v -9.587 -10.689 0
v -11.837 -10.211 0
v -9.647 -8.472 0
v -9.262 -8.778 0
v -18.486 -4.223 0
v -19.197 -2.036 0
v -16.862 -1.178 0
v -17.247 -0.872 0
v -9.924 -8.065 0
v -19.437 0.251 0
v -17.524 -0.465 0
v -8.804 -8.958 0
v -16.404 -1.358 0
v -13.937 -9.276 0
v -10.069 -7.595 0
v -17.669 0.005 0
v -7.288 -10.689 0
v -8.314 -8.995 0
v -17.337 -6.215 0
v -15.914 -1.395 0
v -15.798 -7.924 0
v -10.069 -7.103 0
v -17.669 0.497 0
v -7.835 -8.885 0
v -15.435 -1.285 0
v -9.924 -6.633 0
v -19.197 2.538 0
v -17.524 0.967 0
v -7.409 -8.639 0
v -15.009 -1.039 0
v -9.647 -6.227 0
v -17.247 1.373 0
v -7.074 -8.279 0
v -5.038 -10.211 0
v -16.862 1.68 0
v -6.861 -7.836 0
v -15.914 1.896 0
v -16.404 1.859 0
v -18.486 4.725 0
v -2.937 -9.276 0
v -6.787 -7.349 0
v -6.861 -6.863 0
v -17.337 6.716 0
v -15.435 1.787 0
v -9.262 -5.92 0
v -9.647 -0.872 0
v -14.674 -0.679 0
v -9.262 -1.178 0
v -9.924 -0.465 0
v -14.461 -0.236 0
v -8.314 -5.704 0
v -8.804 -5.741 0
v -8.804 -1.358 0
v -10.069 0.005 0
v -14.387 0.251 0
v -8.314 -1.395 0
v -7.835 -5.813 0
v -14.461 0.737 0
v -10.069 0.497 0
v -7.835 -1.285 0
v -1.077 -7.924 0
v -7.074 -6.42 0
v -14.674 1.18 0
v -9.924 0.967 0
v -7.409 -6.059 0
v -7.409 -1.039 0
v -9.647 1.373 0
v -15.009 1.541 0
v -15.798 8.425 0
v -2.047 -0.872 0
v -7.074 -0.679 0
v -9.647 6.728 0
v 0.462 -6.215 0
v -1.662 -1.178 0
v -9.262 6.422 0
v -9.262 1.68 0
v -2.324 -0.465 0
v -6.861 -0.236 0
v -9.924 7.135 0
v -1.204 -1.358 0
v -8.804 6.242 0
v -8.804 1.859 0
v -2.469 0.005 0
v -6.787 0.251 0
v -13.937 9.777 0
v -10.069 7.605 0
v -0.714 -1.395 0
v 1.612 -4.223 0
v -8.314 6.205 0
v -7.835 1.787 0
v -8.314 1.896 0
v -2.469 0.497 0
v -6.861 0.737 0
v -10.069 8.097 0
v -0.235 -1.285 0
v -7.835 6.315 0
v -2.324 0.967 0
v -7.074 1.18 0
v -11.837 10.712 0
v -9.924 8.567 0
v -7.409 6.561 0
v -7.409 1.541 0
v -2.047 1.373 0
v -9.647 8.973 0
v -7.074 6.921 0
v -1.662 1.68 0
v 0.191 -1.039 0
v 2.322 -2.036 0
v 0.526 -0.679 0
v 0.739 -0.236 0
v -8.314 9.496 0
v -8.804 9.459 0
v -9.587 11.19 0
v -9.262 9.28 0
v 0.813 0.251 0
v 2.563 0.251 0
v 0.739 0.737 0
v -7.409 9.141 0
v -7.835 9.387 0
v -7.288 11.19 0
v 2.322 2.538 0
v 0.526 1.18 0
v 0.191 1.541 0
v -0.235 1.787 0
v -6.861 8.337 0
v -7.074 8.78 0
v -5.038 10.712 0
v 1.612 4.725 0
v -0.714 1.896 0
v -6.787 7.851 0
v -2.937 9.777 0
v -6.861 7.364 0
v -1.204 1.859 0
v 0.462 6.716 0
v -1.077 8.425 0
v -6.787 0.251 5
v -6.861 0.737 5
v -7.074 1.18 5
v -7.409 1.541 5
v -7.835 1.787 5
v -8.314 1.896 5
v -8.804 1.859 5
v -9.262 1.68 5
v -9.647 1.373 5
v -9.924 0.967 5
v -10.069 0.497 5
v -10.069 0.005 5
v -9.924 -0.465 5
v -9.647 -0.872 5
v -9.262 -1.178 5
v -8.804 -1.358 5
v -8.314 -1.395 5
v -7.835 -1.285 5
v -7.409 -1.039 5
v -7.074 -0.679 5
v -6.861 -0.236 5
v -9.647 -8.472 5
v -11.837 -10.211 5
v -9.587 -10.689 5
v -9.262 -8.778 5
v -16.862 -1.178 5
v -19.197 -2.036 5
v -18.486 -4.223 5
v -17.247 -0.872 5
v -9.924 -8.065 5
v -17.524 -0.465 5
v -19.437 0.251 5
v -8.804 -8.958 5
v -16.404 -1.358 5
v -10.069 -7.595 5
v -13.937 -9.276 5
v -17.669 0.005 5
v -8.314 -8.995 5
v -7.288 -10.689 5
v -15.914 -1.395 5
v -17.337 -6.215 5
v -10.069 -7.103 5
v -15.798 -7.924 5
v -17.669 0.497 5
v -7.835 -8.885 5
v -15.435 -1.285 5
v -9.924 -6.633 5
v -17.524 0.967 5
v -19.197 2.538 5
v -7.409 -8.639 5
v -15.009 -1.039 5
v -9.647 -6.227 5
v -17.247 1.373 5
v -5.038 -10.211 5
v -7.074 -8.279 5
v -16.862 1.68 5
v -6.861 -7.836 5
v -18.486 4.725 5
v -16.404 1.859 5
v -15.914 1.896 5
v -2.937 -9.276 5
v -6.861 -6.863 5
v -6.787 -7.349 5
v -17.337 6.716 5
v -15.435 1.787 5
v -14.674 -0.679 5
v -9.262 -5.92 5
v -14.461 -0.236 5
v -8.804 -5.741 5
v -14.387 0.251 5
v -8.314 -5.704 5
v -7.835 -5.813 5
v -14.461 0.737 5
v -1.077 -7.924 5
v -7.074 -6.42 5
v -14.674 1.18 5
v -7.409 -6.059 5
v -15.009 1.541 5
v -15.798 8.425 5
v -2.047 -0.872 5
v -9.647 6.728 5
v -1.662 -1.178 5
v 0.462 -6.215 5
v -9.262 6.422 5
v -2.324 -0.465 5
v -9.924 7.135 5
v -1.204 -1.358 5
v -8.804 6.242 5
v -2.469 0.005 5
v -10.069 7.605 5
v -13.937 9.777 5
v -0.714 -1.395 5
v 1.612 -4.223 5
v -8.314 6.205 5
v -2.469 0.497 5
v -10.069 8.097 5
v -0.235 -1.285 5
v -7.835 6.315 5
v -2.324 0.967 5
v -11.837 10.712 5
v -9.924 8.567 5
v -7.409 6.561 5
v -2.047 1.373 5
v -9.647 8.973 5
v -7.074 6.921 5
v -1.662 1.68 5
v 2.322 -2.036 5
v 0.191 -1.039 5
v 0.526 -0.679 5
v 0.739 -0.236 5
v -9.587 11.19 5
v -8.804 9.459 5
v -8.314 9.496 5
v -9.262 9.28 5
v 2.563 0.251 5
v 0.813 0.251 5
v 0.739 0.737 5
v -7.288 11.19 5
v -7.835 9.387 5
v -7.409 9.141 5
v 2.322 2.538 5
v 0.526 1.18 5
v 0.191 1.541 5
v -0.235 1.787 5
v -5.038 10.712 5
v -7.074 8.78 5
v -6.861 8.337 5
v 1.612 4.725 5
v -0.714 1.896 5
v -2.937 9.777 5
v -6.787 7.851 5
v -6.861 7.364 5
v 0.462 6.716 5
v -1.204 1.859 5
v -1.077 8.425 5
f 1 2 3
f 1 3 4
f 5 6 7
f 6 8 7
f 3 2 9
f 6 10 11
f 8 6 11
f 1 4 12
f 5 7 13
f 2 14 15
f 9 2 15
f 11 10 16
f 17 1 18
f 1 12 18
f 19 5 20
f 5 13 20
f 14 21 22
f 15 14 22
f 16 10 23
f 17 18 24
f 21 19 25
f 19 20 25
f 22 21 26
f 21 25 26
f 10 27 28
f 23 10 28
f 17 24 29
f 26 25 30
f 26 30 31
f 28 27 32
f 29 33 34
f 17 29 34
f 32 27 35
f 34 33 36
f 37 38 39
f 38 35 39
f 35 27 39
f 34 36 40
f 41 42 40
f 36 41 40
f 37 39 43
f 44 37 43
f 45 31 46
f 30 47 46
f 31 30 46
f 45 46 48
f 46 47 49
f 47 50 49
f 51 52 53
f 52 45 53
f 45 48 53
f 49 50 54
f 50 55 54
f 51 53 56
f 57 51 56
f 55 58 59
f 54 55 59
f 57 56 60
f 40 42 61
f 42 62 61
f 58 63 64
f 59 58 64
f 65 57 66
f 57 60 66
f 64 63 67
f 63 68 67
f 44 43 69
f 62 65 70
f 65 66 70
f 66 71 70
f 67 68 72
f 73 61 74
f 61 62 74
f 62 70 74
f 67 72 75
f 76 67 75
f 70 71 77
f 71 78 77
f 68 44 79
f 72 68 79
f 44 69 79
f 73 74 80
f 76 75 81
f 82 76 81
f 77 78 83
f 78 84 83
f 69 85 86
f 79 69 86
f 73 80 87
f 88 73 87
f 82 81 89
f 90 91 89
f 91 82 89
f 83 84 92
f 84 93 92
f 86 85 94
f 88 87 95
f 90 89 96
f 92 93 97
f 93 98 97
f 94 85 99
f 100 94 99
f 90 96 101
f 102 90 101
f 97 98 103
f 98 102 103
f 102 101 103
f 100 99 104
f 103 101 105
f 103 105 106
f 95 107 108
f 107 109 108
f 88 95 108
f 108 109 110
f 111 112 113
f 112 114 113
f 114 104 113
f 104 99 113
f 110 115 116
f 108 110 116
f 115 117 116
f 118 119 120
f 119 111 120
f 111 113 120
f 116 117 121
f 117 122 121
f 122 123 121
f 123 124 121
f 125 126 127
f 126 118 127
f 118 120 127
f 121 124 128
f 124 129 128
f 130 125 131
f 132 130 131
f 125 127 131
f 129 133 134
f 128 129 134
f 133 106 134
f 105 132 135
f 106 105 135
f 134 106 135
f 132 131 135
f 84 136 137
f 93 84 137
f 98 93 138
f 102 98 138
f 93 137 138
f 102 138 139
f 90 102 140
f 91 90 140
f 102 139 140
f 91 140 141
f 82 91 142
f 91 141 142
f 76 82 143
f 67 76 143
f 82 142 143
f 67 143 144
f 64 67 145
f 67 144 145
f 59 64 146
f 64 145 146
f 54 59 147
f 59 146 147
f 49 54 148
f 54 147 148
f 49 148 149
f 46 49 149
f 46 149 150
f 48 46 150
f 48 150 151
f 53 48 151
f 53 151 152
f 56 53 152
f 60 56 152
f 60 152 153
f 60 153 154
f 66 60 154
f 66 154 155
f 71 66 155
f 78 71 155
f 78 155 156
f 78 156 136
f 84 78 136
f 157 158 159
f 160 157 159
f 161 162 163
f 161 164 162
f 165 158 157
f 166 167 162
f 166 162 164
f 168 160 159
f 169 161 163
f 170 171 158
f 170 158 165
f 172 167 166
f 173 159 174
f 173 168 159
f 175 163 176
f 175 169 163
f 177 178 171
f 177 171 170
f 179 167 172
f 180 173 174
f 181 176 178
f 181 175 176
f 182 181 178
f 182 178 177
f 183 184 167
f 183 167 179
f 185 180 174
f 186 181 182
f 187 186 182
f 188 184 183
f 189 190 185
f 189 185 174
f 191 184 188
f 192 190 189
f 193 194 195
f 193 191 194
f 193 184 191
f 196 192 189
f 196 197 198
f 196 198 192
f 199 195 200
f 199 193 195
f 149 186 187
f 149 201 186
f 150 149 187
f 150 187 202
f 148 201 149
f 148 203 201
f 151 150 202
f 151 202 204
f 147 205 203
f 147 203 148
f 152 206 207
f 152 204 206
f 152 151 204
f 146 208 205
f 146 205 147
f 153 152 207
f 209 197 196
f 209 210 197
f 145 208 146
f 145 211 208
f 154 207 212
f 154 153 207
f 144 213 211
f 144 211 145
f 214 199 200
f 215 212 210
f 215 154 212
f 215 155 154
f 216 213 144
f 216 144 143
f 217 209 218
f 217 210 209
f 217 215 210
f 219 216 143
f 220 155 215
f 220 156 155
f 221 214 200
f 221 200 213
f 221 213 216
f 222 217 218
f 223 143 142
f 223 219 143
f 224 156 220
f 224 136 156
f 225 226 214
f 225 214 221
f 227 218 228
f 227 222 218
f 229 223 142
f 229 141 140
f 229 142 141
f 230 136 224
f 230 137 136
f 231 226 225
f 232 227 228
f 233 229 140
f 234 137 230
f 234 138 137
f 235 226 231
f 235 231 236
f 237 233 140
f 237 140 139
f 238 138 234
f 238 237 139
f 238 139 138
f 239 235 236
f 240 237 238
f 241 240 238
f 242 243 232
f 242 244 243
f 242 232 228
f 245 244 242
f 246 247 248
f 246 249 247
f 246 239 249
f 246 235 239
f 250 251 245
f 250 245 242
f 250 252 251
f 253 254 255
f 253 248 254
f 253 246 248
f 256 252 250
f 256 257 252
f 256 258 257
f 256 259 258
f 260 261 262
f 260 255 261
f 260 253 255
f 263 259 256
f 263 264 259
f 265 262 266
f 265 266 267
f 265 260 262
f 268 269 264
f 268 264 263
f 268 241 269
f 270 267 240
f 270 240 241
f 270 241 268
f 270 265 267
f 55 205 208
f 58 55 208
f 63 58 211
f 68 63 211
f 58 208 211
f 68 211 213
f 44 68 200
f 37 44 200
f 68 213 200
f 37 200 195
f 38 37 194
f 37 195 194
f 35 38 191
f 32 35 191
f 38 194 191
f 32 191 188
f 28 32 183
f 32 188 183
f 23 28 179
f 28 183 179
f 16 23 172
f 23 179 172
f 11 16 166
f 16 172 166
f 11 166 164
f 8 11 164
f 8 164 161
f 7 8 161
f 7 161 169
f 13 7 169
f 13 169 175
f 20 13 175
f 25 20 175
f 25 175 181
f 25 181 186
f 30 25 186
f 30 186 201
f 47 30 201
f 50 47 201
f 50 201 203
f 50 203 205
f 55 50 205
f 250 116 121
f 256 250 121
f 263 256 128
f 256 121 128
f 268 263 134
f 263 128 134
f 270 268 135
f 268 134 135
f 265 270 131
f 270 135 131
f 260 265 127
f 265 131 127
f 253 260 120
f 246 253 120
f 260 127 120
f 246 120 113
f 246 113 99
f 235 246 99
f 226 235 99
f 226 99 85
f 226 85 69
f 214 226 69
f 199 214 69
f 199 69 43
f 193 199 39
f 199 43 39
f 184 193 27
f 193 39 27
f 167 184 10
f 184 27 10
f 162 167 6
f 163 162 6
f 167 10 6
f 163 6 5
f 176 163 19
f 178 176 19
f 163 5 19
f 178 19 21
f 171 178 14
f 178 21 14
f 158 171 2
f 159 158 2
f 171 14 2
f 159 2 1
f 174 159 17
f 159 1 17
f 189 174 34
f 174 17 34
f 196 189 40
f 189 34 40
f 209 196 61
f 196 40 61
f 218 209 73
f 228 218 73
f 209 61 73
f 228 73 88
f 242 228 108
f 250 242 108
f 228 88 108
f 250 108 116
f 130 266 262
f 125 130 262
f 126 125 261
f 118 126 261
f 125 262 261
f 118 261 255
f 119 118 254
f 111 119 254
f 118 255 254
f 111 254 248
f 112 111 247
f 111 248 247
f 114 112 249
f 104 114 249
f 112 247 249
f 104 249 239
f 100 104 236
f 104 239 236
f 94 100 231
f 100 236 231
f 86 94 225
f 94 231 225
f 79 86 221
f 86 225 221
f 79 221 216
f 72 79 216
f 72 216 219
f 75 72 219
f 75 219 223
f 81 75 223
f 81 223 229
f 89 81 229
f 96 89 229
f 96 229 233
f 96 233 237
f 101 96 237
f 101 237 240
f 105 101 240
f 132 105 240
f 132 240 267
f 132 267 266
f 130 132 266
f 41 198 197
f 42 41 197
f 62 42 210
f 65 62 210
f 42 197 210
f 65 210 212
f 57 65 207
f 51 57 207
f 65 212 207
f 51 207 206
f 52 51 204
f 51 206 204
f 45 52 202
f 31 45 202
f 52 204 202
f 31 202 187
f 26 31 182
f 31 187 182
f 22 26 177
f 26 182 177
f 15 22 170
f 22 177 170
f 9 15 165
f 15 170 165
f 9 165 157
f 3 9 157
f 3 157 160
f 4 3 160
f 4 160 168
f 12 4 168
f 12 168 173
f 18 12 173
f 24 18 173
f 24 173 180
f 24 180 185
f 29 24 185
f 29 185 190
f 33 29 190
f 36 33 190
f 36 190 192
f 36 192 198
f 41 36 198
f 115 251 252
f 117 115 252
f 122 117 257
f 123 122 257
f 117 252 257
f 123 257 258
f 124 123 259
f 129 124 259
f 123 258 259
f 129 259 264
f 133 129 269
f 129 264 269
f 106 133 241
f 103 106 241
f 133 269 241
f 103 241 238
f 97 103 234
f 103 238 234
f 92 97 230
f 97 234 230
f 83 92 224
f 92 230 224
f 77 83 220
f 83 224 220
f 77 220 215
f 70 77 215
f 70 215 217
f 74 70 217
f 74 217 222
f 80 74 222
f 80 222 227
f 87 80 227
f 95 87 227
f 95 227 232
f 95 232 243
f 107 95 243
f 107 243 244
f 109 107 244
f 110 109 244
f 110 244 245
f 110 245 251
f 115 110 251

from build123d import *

# Parameters (mm, degrees)
SKETCH1_R           = 11
BOSS_EXTRUDE1_DEPTH = 5
SKETCH2_R           = 1.65
CUT_EXTRUDE2_DEPTH  = 21


with BuildPart() as part:
    # Sketch1 → Boss-Extrude1 (new body)
    with BuildSketch(Plane.XY):
        with Locations((-8.437318413, 0.250726348)):
            Circle(SKETCH1_R)
    extrude(amount=BOSS_EXTRUDE1_DEPTH)

    # Sketch2 → Cut-Extrude2 (cut)
    with BuildSketch(Plane.XY.offset(5)):
        with Locations((-8.437318413, 7.850726348)):
            Circle(SKETCH2_R)
        with Locations((-0.837318413, 0.250726348)):
            Circle(SKETCH2_R)
        with Locations((-8.437318413, -7.349273652)):
            Circle(SKETCH2_R)
        with Locations((-16.037318413, 0.250726348)):
            Circle(SKETCH2_R)
        with Locations((-8.437318413, 0.250726348)):
            Circle(SKETCH2_R)
    extrude(amount=-CUT_EXTRUDE2_DEPTH, mode=Mode.SUBTRACT)


solid = part.part
